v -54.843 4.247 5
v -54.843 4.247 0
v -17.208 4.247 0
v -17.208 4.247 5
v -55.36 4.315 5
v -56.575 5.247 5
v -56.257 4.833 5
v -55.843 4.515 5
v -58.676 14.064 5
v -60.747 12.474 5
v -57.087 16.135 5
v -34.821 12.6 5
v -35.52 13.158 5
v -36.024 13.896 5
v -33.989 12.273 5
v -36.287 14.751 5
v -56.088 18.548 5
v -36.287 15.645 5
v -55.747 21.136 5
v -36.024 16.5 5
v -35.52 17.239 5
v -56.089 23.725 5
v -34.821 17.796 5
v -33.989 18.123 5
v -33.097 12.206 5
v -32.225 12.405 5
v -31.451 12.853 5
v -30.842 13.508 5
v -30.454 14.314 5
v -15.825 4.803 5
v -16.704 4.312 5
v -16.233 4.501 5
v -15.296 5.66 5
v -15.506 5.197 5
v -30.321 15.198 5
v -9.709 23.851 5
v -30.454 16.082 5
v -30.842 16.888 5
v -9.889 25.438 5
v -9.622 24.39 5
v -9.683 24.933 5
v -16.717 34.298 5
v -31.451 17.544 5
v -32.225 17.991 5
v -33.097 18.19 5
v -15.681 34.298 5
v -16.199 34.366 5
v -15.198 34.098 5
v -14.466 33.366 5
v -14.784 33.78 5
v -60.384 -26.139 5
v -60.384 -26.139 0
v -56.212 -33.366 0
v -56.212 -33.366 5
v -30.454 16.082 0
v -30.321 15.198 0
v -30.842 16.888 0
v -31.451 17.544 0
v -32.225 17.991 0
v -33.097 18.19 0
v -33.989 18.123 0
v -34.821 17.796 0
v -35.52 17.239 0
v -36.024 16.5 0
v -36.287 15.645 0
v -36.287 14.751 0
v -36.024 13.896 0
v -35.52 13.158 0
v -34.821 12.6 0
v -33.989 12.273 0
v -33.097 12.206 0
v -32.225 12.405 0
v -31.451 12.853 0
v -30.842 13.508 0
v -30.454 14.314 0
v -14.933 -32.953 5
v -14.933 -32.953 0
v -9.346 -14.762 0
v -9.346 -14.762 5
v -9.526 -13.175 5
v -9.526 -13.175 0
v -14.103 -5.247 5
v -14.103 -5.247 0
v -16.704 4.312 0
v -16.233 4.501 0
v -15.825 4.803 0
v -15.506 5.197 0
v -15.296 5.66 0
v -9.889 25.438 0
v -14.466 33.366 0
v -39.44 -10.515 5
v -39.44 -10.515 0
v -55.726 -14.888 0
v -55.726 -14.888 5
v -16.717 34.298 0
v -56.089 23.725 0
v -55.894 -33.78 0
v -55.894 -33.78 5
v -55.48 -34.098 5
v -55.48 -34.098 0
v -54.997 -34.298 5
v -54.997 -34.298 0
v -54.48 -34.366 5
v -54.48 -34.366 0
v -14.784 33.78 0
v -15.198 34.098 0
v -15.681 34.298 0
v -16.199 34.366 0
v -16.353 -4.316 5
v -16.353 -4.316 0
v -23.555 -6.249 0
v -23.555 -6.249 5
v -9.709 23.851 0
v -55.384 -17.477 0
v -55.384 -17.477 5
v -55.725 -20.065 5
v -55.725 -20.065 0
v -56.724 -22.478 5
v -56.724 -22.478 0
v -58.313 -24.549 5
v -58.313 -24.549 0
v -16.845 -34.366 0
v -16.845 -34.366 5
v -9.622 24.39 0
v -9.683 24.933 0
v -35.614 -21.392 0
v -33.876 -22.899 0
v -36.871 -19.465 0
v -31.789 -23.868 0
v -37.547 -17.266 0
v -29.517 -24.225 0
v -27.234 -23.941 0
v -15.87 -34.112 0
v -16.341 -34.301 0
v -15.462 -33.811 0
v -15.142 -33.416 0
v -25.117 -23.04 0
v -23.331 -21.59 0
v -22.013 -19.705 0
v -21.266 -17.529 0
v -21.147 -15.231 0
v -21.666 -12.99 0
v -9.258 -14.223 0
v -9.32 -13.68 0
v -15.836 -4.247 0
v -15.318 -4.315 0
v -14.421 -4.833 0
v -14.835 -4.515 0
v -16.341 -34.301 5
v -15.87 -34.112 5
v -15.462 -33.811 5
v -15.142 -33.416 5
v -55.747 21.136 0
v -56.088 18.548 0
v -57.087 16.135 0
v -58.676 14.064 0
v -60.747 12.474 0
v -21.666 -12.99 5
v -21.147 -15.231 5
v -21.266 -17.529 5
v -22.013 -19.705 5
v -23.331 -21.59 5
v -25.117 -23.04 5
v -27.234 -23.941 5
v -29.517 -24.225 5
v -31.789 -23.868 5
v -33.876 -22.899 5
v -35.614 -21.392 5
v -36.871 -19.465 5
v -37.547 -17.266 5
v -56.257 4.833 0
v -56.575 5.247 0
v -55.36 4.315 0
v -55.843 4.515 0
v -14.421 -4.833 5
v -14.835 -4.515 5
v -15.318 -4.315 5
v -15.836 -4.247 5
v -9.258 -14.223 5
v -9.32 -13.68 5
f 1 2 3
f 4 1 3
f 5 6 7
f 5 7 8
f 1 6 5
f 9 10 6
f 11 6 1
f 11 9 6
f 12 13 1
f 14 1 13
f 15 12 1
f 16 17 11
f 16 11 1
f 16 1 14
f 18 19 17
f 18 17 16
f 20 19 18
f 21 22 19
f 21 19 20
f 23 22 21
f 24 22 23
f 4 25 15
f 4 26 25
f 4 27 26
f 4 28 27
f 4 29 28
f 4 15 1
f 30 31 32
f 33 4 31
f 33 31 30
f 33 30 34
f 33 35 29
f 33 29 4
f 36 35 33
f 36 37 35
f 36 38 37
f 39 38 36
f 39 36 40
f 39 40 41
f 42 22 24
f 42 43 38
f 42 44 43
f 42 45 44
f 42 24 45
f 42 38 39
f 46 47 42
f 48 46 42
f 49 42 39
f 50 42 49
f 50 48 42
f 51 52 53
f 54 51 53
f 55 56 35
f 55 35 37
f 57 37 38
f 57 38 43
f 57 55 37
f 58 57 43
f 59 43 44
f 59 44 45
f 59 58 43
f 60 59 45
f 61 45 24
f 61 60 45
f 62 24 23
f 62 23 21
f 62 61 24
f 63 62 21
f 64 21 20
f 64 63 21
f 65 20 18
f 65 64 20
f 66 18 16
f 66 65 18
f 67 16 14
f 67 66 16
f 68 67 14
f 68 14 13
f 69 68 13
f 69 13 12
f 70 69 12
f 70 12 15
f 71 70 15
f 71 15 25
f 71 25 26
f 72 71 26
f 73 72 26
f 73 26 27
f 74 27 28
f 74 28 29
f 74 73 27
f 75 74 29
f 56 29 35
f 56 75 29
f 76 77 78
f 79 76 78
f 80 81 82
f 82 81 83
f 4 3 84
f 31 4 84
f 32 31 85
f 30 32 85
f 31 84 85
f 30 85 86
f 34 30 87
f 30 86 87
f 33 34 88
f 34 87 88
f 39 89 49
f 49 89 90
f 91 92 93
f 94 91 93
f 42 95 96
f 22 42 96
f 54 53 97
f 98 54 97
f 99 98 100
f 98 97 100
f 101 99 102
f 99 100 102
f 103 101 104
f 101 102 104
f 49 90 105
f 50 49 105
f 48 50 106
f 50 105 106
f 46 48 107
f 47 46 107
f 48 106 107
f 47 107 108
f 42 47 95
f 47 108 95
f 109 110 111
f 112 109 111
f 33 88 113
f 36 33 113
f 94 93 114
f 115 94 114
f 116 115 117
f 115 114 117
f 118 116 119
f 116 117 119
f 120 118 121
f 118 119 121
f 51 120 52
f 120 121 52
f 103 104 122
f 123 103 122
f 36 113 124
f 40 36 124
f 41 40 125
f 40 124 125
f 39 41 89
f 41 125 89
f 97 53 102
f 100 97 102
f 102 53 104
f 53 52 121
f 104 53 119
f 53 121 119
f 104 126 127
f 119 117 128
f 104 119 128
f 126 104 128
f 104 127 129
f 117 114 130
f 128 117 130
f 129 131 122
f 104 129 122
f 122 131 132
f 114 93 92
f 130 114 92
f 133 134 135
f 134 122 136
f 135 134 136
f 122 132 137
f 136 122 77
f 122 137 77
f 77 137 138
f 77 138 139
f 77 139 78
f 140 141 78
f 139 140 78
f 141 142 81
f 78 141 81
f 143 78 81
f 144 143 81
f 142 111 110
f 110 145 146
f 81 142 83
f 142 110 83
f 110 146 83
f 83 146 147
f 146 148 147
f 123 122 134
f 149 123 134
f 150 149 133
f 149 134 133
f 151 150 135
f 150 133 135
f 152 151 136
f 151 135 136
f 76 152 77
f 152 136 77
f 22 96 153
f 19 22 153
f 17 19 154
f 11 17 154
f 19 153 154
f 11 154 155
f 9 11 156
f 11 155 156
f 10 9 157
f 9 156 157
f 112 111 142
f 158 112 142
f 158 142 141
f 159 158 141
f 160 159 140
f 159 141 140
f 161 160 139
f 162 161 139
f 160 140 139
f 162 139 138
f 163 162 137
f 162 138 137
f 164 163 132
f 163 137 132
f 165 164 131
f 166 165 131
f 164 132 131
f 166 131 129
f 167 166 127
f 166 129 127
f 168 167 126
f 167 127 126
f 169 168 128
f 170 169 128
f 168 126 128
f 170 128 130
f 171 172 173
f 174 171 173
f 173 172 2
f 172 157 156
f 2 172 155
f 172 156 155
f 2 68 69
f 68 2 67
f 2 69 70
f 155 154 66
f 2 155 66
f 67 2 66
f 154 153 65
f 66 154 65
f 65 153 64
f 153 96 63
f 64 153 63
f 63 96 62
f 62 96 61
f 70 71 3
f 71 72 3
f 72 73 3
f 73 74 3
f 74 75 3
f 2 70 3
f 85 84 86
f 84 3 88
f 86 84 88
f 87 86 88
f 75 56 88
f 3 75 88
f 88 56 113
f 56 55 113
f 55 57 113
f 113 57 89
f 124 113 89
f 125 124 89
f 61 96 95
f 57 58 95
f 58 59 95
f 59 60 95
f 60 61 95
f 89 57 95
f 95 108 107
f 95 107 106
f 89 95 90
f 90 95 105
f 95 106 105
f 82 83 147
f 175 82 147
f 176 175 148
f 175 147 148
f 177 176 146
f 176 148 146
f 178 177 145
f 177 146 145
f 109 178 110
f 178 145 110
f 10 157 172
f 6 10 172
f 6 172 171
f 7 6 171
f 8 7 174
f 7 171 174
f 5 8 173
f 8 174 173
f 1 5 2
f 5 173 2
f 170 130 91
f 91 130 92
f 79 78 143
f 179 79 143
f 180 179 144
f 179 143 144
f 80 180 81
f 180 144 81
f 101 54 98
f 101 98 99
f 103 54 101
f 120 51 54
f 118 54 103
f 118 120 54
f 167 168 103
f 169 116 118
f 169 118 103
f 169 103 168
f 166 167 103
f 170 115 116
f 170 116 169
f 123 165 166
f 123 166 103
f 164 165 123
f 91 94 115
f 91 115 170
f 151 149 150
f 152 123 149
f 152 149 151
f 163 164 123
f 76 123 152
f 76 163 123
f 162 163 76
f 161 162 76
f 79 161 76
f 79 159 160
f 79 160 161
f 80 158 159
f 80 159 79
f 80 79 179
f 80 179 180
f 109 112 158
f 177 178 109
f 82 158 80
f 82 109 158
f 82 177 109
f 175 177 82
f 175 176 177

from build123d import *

# Parameters (mm, degrees)
F0_R     = 3
F1_DEPTH = 5
F2_DEPTH = 5


# Not quite as in the source:
# - ends of sketch curves that miss each other by under 0.0002 mm in the source are joined


with BuildPart() as f1:
    # F0 (on Top) → F1 (new body)
    with BuildSketch(Plane.XY):
        with BuildLine():
            Line((-9.888975, 25.438376), (-14.465956, 33.365941))
            ThreePointArc((-14.465956, 33.365941), (-15.4331378873, 34.2139061621), (-16.71668586, 34.2975134786))
            Line((-16.71668586, 34.2975134786), (-56.088806, 23.725041))
            ThreePointArc((-56.088806, 23.725041), (-56.5082159612, 17.3088367317), (-60.7474589836, 12.4743359716))
            Line((-60.7474589836, 12.4743359716), (-56.574809, 5.247095))
            ThreePointArc((-56.574809, 5.247095), (-55.8427580417, 4.5150442165), (-54.842758, 4.247095))
            Line((-54.842758, 4.247095), (-17.208055, 4.247095))
            ThreePointArc((-17.208055, 4.247095), (-16.019435709, 4.6386223763), (-15.2961934105, 5.6599108189))
            Line((-15.2961934105, 5.6599108189), (-9.709164, 23.851193))
            ThreePointArc((-9.709164, 23.851193), (-9.633738266, 24.6635147626), (-9.888975, 25.438376))
        make_face()
        with Locations((-33.32098, 15.198094)):
            Circle(F0_R, mode=Mode.SUBTRACT)
    extrude(amount=F1_DEPTH)


with BuildPart() as f2:
    # F0 (on Top) → F2 (new body)
    with BuildSketch(Plane.XY):
        with BuildLine():
            Line((-16.353472, -4.315521), (-23.554763, -6.249261))
            Line((-23.554763, -6.249261), (-21.665791, -12.990118))
            ThreePointArc((-21.665791, -12.990118), (-27.2335281118, -23.941313877), (-37.5470821174, -17.2660610188))
            Line((-37.5470821174, -17.2660610188), (-39.44013, -10.514909))
            Line((-39.44013, -10.514909), (-55.725593, -14.887994))
            ThreePointArc((-55.725593, -14.887994), (-56.1450019117, -21.3041981487), (-60.3842449836, -26.1386990284))
            Line((-60.3842449836, -26.1386990284), (-56.211595, -33.36594))
            ThreePointArc((-56.211595, -33.36594), (-55.4795440417, -34.0979907835), (-54.479544, -34.36594))
            Line((-54.479544, -34.36594), (-16.844842, -34.36594))
            ThreePointArc((-16.844842, -34.36594), (-15.6562225909, -33.9744125364), (-14.9329803243, -32.9531239004))
            Line((-14.9329803243, -32.9531239004), (-9.34595, -14.761842))
            ThreePointArc((-9.34595, -14.761842), (-9.2705242122, -13.9495197123), (-9.5257611443, -13.1746580833))
            Line((-9.5257611443, -13.1746580833), (-14.102742, -5.247094))
            ThreePointArc((-14.102742, -5.247094), (-15.0699238873, -4.3991288379), (-16.353472, -4.315521))
        make_face()
    extrude(amount=F2_DEPTH)


solid = Compound([f1.part, f2.part])
